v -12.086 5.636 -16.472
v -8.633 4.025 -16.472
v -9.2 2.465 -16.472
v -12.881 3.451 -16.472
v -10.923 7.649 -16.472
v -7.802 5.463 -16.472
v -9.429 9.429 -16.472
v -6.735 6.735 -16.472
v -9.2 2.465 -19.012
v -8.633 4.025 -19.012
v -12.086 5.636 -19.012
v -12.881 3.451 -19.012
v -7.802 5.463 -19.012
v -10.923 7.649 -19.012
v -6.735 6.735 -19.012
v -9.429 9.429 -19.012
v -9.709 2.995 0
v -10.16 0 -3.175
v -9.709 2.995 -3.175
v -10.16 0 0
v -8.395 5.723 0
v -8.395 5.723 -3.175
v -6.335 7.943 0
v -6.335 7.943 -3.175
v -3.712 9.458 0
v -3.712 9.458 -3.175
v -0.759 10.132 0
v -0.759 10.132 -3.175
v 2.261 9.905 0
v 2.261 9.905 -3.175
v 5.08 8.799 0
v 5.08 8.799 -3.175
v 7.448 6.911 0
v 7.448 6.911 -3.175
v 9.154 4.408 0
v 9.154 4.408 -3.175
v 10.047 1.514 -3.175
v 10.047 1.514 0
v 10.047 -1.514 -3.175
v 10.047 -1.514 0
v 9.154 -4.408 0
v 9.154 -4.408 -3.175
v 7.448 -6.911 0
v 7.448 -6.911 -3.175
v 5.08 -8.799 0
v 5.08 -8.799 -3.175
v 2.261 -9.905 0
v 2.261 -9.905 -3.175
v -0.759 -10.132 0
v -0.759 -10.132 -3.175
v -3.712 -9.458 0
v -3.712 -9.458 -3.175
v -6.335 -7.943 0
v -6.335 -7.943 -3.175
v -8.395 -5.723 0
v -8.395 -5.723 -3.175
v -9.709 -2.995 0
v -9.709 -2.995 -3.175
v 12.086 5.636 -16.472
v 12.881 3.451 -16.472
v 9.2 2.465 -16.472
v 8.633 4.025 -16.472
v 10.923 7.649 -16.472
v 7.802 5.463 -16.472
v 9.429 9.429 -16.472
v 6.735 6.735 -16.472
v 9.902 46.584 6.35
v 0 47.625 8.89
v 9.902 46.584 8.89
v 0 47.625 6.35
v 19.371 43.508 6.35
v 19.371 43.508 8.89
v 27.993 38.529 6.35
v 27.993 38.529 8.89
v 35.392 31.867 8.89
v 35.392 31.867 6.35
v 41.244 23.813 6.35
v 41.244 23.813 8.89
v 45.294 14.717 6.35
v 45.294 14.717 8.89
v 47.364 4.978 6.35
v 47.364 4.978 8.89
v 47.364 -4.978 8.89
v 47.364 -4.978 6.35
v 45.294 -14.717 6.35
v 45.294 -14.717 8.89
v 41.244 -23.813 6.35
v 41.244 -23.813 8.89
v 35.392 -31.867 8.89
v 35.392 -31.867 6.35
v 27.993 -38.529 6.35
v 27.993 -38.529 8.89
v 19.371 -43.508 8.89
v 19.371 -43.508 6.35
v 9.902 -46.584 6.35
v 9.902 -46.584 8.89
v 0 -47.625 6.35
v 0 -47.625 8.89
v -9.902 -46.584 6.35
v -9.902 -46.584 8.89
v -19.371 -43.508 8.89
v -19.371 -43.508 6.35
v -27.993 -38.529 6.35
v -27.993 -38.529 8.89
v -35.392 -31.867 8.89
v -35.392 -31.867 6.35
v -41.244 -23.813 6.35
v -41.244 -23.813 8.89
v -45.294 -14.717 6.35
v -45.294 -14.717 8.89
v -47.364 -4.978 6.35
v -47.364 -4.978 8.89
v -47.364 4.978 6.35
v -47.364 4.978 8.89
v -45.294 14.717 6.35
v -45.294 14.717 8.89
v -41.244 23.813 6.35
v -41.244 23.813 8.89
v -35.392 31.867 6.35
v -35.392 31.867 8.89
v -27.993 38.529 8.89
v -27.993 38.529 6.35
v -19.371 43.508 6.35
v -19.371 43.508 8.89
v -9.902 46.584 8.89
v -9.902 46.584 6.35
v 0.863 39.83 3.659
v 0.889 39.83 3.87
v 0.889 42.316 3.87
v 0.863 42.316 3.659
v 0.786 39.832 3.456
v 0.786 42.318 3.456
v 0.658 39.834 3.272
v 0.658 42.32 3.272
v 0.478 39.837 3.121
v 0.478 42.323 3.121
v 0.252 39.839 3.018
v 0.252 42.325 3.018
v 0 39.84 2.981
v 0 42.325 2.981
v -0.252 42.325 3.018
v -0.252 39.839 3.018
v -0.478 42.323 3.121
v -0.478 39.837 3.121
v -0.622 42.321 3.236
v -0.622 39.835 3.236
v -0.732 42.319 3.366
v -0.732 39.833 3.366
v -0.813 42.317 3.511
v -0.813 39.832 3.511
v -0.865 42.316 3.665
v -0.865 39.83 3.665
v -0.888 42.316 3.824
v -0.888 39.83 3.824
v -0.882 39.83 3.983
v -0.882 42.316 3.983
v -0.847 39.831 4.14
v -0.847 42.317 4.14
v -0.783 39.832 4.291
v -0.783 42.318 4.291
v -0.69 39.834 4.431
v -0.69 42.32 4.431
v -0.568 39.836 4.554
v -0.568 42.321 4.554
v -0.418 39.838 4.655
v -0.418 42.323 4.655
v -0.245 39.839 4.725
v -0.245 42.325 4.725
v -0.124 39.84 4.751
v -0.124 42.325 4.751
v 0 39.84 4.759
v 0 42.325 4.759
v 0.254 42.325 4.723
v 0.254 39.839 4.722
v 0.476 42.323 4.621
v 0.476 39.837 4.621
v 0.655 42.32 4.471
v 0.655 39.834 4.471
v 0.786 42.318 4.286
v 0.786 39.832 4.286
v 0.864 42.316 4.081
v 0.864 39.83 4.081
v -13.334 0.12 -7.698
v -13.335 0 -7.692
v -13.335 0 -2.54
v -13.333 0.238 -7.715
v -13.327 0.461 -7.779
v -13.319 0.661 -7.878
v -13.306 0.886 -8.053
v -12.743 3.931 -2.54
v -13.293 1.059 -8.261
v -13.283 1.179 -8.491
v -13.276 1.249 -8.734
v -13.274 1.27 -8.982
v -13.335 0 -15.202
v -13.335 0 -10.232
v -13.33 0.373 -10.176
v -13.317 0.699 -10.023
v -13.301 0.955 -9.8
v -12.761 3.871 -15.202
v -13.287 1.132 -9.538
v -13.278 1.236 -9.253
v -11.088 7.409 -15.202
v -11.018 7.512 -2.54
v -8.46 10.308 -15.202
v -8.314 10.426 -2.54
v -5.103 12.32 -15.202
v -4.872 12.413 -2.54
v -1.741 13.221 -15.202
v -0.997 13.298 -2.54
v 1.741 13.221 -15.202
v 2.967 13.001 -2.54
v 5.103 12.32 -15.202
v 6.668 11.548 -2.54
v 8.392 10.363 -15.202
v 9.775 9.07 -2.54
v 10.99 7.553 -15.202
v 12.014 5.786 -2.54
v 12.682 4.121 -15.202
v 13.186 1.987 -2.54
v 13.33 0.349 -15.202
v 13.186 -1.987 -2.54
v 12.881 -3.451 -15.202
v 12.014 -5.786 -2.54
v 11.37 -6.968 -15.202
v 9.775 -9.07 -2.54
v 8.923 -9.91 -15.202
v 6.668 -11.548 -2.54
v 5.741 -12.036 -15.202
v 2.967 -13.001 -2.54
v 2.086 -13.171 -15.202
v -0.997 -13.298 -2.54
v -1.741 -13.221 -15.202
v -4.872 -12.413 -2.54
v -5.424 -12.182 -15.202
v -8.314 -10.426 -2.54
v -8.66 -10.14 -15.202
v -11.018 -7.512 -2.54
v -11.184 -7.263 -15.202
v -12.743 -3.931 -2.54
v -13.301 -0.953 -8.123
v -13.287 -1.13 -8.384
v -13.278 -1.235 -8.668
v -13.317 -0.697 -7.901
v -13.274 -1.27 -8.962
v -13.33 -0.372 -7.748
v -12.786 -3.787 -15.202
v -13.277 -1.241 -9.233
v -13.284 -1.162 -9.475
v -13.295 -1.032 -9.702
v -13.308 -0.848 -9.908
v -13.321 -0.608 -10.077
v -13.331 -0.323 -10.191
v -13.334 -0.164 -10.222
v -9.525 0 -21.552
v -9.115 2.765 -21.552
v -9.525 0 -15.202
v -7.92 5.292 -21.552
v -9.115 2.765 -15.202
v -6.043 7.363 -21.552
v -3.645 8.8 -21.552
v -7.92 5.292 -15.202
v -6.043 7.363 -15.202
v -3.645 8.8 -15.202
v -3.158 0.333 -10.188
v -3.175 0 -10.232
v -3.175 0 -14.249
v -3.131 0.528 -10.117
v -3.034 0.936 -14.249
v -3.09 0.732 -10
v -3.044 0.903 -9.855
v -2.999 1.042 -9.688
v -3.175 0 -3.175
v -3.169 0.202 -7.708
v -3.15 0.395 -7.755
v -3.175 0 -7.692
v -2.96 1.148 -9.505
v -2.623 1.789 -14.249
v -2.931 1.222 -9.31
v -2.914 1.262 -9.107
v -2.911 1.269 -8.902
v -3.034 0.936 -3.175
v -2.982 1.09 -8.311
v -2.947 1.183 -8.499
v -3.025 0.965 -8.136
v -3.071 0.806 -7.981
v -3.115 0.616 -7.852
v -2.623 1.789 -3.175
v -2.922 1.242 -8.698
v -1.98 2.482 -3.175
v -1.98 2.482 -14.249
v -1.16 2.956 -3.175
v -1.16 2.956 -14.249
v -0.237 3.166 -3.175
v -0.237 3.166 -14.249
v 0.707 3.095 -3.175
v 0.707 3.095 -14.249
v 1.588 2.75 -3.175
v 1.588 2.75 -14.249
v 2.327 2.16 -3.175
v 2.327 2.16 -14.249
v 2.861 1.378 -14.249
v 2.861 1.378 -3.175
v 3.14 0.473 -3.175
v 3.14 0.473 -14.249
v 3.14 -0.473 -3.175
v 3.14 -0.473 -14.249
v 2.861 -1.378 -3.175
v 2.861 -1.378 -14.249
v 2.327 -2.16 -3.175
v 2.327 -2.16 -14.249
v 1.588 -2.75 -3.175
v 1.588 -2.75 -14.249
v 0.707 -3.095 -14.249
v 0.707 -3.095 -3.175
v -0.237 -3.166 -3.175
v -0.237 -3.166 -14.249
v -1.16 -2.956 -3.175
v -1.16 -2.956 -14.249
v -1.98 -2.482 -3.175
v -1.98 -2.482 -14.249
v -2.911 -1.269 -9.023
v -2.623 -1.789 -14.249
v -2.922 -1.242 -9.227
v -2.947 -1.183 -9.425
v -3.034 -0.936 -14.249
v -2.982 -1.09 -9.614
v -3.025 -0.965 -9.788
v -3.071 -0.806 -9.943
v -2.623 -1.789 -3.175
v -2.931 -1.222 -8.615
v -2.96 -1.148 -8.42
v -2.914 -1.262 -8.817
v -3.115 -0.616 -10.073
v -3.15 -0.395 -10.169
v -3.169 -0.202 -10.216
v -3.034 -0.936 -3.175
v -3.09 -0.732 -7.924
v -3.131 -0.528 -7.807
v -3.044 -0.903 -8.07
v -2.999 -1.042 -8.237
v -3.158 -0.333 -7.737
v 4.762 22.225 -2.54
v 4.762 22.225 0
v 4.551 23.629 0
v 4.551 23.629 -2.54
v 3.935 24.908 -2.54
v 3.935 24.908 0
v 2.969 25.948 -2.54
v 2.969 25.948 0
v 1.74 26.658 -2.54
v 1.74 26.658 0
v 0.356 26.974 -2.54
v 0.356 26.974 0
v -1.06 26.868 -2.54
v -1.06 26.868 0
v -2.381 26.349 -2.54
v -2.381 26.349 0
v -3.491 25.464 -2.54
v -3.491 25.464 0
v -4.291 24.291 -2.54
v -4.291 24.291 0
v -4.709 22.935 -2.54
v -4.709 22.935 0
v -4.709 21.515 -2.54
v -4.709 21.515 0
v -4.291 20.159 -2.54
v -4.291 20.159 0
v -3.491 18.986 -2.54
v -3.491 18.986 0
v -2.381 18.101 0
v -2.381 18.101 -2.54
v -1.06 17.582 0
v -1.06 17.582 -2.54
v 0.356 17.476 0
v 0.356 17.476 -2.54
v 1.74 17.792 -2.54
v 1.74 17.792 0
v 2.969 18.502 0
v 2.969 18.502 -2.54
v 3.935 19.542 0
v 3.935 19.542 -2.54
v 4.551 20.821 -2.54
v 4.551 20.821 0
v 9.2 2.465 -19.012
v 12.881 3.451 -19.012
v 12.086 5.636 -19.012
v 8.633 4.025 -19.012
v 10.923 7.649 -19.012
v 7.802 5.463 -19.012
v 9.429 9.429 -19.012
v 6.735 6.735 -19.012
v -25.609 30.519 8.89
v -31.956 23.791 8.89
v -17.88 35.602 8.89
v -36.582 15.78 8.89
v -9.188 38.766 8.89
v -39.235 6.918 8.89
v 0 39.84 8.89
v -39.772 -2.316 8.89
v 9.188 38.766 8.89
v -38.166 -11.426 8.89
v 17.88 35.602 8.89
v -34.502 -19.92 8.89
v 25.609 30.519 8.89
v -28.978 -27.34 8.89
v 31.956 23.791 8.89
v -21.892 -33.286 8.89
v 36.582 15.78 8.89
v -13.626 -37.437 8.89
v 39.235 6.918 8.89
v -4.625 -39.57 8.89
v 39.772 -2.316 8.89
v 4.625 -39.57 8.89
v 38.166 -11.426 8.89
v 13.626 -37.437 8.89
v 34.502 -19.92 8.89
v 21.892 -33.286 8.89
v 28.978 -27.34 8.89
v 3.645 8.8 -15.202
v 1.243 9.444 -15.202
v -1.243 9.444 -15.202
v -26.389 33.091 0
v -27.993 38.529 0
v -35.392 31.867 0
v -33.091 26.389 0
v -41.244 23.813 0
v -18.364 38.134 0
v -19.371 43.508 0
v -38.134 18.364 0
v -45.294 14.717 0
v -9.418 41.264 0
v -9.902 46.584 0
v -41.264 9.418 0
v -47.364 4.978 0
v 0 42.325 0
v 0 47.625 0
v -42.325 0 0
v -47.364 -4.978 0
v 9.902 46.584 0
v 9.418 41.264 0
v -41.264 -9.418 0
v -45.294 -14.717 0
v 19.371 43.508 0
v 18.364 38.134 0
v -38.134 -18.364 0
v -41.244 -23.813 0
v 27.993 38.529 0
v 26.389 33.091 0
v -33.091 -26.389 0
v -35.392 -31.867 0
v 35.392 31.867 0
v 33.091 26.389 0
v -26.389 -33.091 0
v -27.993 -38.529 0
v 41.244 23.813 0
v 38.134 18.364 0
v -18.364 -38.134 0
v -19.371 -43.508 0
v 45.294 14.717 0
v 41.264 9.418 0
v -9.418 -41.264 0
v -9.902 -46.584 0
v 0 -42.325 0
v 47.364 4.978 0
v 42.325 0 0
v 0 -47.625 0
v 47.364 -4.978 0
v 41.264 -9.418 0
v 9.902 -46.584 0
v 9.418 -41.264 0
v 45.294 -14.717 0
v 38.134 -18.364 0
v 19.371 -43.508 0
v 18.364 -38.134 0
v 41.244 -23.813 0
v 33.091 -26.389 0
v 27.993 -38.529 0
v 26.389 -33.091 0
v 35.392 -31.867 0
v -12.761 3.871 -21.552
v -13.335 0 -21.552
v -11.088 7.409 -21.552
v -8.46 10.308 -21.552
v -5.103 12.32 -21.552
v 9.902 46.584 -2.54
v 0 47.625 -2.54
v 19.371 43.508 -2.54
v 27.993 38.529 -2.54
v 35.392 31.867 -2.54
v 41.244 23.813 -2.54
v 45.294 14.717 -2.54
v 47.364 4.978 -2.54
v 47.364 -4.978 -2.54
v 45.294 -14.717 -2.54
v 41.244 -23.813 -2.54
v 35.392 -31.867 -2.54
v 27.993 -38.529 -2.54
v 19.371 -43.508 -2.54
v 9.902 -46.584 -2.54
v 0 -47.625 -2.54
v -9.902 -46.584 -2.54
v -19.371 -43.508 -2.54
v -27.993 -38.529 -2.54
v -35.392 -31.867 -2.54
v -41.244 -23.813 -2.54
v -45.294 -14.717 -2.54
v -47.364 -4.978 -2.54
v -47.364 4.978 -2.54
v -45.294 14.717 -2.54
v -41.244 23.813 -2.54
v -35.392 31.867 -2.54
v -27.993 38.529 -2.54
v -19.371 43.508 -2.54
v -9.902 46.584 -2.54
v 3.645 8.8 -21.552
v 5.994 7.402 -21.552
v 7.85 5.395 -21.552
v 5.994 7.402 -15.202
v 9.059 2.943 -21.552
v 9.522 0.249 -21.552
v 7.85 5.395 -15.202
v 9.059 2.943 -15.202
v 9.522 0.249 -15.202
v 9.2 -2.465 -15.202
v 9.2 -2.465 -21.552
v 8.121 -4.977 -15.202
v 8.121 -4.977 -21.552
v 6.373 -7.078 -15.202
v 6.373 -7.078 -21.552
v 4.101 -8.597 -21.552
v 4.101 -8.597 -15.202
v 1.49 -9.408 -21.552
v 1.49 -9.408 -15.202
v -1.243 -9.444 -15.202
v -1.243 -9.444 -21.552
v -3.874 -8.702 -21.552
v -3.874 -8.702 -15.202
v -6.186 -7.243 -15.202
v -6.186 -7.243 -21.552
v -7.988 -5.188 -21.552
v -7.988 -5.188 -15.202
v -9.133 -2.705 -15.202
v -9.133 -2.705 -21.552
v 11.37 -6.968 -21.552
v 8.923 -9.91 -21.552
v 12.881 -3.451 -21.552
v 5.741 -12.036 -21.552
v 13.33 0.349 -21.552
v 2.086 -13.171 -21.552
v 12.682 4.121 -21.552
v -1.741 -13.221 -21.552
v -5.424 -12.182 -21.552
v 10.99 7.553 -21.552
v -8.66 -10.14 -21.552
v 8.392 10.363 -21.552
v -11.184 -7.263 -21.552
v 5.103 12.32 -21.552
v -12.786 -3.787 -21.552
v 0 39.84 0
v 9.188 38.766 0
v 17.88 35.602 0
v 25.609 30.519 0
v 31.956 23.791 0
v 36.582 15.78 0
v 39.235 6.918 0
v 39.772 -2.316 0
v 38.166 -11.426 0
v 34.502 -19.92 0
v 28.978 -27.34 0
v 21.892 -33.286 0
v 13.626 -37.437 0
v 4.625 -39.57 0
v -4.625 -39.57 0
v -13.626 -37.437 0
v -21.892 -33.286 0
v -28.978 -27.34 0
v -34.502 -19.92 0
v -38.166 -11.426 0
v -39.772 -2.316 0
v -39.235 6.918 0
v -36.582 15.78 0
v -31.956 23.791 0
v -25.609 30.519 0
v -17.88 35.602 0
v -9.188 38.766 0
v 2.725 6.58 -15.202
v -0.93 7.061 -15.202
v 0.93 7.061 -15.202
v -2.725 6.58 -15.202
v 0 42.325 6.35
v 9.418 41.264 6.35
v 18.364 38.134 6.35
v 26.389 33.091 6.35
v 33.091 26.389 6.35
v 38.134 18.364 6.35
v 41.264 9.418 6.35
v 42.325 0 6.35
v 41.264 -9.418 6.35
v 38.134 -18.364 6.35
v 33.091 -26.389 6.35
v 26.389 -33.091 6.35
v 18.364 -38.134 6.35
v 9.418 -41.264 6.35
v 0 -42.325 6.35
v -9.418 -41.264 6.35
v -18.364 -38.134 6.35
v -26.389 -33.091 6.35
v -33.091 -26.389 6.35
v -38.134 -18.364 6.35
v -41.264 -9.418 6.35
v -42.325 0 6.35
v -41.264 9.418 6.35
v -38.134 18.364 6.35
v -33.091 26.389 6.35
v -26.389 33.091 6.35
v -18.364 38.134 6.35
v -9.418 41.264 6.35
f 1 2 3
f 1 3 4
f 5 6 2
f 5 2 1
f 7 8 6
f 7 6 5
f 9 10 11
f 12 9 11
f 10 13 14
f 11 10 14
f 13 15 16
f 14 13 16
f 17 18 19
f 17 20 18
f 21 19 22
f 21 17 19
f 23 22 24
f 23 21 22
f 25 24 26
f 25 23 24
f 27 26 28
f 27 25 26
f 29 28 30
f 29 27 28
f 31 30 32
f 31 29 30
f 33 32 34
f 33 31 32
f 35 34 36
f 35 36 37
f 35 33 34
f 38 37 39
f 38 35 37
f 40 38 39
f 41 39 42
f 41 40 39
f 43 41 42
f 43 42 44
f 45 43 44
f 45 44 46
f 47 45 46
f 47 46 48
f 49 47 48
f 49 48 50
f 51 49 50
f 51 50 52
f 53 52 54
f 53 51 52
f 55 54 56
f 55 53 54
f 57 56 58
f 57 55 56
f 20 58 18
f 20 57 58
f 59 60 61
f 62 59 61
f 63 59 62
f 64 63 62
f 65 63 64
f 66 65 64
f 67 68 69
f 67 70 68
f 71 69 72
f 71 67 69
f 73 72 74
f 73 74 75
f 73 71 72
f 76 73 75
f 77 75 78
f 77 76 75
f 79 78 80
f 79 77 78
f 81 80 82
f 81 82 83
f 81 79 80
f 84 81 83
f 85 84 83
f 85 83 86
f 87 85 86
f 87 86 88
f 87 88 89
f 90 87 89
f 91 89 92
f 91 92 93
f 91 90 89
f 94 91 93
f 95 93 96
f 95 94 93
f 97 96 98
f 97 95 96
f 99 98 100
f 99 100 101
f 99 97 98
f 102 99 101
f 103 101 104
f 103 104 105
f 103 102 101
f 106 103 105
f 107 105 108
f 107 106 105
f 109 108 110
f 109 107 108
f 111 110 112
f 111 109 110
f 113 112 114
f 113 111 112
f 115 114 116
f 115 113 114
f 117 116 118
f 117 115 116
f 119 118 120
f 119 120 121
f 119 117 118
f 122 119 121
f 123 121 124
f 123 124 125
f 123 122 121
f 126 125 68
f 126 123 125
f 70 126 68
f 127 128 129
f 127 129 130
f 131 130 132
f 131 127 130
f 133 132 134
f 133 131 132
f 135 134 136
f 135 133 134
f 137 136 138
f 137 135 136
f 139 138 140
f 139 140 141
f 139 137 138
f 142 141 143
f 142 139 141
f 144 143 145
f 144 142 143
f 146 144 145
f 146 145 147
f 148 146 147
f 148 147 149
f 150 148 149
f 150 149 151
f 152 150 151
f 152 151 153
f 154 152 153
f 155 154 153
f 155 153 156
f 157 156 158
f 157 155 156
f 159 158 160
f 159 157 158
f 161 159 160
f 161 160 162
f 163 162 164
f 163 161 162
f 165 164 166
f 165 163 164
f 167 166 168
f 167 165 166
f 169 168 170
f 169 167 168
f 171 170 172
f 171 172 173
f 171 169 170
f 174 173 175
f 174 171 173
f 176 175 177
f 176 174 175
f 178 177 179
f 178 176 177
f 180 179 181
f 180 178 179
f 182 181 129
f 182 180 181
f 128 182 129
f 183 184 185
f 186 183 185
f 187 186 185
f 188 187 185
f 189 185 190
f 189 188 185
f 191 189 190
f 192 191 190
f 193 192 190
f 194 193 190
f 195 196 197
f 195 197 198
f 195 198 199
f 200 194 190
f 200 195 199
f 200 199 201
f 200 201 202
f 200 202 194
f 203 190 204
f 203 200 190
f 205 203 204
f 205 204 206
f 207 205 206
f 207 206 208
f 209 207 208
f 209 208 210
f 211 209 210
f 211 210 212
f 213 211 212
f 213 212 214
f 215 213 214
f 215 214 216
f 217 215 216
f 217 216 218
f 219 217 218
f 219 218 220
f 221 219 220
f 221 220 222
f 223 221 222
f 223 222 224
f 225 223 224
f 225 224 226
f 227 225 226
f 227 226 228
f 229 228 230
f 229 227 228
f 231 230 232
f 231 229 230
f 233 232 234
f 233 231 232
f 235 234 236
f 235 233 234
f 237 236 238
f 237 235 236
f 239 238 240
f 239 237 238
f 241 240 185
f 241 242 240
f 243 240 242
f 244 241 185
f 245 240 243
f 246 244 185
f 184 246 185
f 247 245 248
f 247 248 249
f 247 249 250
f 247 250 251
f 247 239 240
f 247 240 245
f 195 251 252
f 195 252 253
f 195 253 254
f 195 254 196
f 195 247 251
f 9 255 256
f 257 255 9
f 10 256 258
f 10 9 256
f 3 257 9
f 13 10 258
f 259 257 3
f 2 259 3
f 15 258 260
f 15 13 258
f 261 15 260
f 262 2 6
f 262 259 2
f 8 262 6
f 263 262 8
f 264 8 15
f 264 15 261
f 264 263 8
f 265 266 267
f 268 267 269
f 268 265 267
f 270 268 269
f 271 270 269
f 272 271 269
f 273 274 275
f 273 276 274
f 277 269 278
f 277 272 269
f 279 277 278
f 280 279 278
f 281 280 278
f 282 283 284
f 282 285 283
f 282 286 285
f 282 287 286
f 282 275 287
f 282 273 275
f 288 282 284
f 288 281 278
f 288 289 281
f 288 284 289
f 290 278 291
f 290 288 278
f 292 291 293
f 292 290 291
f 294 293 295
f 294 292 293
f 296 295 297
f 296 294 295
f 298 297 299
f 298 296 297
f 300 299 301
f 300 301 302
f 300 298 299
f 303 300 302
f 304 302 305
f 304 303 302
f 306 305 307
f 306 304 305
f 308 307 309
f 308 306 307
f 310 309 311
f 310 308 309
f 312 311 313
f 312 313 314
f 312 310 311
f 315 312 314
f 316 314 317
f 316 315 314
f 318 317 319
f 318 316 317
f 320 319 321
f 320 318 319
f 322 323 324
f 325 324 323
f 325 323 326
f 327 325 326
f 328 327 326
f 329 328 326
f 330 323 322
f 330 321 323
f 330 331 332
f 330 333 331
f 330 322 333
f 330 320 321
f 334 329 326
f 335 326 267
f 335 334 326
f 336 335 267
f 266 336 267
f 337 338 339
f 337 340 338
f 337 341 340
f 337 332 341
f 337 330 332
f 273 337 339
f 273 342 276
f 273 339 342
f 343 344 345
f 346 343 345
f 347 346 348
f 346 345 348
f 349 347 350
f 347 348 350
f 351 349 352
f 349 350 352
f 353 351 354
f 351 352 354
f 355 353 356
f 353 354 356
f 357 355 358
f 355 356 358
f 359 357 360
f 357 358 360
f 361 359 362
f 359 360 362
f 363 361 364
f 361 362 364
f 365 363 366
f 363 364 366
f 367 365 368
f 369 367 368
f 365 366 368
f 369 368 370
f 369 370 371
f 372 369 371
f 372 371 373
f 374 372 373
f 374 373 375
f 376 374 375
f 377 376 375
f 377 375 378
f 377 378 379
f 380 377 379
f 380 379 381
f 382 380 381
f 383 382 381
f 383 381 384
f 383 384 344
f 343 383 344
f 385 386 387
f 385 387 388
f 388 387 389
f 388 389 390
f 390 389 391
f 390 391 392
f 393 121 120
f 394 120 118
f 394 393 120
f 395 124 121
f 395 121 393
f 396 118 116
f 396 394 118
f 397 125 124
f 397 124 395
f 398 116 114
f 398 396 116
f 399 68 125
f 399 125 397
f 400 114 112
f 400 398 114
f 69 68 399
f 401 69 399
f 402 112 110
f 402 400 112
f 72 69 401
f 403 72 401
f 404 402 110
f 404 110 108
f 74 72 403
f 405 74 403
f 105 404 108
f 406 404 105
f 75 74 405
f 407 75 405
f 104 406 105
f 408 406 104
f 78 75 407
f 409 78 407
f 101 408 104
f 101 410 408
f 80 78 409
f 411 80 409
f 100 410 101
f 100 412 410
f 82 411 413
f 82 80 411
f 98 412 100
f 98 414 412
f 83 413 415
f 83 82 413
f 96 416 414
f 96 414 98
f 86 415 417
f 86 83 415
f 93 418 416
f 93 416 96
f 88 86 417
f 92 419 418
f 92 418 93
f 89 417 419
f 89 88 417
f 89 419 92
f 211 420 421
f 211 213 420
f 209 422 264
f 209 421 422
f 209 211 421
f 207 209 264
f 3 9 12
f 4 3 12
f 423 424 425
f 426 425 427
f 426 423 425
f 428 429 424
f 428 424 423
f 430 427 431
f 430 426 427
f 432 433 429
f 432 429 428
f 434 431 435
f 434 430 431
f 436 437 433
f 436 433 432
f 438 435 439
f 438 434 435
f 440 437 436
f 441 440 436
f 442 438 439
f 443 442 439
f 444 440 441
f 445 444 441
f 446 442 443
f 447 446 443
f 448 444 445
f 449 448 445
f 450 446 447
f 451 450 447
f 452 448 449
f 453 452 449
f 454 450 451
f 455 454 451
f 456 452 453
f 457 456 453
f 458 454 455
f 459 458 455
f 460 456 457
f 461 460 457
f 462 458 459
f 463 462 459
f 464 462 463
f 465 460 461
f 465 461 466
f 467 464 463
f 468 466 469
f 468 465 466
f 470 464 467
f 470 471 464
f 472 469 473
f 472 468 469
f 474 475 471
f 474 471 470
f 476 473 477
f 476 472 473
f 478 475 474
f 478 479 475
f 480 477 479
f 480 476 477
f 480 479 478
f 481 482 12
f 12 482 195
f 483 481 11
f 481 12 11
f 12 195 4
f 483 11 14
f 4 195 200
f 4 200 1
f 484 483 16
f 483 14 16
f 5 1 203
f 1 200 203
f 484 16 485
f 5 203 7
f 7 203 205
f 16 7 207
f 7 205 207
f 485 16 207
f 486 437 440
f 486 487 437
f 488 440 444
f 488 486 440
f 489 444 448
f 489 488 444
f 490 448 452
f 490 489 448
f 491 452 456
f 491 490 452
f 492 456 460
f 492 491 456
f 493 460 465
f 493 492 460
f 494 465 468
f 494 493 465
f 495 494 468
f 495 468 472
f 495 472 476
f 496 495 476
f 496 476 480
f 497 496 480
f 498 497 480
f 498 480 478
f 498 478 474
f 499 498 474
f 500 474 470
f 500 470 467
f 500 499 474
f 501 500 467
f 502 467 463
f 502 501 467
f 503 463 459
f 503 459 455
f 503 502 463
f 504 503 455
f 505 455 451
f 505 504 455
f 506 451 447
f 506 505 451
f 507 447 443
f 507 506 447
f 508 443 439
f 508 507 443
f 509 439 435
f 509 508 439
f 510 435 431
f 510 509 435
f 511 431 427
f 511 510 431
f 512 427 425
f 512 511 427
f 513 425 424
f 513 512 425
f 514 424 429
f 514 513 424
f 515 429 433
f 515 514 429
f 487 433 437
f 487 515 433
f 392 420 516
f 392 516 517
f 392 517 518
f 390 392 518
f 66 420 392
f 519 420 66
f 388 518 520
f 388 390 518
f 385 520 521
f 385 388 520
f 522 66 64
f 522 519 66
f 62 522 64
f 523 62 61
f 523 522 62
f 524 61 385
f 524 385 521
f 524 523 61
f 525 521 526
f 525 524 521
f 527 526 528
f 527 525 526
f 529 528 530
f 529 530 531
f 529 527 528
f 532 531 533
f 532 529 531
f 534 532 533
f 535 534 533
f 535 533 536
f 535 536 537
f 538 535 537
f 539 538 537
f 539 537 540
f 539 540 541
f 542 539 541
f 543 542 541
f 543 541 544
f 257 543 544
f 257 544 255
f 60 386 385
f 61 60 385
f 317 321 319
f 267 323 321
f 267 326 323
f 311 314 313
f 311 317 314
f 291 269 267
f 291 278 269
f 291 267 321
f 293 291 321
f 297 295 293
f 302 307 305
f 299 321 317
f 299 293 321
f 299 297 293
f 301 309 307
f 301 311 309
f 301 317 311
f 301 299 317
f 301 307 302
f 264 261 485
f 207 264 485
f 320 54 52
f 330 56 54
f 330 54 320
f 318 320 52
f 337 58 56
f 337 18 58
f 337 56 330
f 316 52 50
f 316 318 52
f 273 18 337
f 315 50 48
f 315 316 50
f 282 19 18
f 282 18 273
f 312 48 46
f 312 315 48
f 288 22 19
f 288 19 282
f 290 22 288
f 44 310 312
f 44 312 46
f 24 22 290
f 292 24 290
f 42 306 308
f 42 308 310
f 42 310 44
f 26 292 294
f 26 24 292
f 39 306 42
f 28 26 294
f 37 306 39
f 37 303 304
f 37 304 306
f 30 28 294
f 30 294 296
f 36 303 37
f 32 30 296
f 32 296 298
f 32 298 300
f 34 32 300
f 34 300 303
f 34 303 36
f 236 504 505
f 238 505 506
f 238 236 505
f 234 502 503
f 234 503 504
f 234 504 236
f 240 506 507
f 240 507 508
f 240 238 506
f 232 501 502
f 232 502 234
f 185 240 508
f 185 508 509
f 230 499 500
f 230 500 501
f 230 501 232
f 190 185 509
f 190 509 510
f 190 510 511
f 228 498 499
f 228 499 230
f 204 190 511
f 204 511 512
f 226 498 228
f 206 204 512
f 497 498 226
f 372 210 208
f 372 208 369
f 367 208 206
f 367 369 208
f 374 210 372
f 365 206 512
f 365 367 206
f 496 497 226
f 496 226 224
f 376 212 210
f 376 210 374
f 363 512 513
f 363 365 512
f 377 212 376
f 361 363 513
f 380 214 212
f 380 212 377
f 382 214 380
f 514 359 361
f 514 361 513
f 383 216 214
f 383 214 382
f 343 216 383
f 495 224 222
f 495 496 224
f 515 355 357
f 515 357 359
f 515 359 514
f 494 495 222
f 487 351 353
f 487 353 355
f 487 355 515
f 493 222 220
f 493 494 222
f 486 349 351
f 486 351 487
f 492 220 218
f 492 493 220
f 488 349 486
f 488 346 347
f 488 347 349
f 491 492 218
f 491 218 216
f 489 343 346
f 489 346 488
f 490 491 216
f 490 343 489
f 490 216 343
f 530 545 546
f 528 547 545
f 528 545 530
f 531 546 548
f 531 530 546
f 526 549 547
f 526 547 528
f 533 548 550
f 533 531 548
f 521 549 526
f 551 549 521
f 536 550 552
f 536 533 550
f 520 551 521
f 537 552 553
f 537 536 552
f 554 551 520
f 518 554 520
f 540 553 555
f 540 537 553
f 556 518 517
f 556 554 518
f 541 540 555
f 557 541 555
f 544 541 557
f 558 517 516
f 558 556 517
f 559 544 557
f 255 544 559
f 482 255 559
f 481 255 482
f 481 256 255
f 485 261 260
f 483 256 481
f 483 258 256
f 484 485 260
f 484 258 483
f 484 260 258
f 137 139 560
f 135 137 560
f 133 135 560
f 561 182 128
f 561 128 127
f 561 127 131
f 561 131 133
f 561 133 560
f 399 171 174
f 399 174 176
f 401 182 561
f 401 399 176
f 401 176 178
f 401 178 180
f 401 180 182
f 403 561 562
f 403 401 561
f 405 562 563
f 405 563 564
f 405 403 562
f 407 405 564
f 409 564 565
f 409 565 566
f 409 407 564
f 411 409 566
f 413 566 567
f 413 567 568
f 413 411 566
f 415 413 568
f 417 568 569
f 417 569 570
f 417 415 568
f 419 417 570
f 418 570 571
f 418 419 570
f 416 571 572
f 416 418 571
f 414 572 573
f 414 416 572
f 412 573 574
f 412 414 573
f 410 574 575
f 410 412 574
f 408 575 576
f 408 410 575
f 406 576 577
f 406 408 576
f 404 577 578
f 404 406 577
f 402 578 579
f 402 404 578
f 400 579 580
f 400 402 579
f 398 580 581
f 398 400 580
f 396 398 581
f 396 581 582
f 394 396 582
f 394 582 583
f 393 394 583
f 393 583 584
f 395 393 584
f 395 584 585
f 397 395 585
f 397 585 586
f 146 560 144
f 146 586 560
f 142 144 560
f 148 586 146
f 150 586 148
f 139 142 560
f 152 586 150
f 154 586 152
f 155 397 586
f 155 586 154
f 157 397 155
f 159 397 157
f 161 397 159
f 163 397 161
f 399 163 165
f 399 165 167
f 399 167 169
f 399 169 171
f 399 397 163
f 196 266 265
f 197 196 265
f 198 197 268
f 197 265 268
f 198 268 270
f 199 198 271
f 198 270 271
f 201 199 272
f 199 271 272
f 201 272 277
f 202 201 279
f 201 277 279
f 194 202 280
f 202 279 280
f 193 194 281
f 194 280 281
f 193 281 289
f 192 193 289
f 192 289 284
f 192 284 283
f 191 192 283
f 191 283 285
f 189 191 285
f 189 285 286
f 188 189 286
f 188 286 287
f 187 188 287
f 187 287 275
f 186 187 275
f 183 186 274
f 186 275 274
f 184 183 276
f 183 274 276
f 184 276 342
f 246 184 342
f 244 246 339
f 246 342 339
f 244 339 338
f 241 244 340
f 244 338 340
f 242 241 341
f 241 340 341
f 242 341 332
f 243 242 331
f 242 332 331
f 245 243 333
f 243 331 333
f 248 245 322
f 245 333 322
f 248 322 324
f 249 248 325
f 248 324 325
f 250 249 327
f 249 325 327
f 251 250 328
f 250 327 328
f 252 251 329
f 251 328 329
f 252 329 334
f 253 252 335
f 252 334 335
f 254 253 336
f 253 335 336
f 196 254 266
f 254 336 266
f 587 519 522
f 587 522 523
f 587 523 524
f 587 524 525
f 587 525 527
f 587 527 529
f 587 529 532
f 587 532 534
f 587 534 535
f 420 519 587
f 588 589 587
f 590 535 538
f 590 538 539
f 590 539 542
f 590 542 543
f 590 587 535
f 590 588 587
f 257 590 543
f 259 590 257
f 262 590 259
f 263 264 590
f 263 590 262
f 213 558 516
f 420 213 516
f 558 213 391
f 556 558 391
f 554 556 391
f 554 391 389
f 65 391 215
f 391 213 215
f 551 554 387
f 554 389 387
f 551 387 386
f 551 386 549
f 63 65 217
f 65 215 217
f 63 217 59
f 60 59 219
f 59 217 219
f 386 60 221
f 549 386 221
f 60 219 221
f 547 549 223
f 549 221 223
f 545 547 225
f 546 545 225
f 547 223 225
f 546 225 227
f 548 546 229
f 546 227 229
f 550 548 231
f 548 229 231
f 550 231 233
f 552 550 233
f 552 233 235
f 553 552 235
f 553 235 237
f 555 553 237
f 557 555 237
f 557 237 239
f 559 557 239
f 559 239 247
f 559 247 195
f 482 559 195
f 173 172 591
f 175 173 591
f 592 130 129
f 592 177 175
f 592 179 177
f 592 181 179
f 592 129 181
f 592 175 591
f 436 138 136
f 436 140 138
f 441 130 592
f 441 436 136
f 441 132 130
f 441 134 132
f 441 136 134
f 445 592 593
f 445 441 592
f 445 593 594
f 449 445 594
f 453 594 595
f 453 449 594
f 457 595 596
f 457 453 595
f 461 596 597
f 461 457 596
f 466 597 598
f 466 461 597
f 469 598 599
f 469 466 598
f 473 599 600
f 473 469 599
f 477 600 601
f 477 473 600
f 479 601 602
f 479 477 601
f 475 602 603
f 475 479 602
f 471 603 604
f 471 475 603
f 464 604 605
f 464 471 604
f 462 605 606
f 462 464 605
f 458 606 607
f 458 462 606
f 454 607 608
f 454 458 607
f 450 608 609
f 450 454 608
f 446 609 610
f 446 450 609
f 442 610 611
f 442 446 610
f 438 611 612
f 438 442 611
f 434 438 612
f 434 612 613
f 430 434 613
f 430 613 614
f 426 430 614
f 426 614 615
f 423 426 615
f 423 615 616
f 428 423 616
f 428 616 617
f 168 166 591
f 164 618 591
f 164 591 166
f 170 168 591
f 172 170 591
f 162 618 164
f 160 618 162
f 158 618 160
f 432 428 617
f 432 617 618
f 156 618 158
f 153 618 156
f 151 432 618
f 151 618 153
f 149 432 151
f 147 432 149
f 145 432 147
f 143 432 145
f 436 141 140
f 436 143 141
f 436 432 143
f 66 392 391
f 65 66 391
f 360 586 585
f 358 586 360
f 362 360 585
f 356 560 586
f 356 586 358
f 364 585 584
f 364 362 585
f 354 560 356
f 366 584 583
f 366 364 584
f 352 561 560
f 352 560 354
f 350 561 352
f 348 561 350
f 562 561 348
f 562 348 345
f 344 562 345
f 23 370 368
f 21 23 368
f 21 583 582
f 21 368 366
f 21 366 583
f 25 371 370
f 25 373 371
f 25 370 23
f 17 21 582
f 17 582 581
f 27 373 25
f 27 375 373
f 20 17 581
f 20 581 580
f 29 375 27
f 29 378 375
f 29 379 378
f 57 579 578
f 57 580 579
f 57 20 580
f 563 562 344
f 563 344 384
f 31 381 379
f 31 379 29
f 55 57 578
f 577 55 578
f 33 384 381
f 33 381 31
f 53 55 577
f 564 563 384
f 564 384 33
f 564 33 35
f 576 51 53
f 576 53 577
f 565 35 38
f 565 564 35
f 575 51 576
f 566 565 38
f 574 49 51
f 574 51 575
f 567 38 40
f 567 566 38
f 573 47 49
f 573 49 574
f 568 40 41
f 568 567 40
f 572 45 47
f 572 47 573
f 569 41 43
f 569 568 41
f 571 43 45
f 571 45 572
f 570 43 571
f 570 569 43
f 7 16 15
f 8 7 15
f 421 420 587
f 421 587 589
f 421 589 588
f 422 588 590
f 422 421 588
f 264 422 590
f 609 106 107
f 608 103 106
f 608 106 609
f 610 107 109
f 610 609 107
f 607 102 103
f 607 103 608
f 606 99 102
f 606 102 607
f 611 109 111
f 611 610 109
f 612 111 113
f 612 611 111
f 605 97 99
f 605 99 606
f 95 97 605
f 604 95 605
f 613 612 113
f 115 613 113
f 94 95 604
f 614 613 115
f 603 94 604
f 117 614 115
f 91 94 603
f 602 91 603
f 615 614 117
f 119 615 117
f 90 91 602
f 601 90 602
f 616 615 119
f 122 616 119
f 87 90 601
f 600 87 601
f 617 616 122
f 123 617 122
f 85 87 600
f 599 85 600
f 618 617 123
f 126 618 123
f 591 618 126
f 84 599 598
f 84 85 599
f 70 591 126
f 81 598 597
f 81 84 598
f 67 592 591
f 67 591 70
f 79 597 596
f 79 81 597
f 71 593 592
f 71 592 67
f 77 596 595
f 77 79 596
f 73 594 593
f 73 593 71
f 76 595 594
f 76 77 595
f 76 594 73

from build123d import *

# Parameters (mm, degrees)
SKETCH3_R           = 10.16
CUT_EXTRUDE1_DEPTH  = 2.54
SKETCH5_R           = 4.7625
CUT_EXTRUDE2_DEPTH  = 6.35
SKETCH6_R           = 13.335
SKETCH6_R_2         = 9.525
BOSS_EXTRUDE1_DEPTH = 6.35
SKETCH7_R           = 1.27
CUT_EXTRUDE3_DEPTH  = 25.4
CUT_EXTRUDE4_DEPTH  = 6.35
CUT_EXTRUDE5_DEPTH  = 2.54
SKETCH11_R          = 0.889
CUT_EXTRUDE6_DEPTH  = 55.372


with BuildPart() as part:
    # Sketch2 → Revolve1 (revolve)
    with BuildSketch(Plane(origin=(0, 0, 0), x_dir=(0, 0, -1), z_dir=(1, 0, 0))):
        Polygon((-6.35, 42.32529), (0, 42.32529), (0, 47.625), (2.54, 47.625), (2.54, 0), (0, 0), (0, 39.839805153), (-8.89, 39.839805153), (-8.89, 47.625), (-6.35, 47.625), align=None)
    revolve(axis=Axis((0, 0, 0), (0, 0, -1)))

    # Sketch3 → Cut-Extrude1 (cut)
    with BuildSketch(Plane.XY):
        Circle(SKETCH3_R)
    extrude(amount=-CUT_EXTRUDE1_DEPTH, mode=Mode.SUBTRACT)

    # Sketch4 → Revolve2 (revolve)
    with BuildSketch(Plane(origin=(0, 0, 0), x_dir=(1, 0, 0), z_dir=(0, 1, 0))):
        Polygon((0, 14.2494), (-3.175, 14.2494), (-3.175, 3.175), (-10.16, 3.175), (-10.16, 0), (-13.335, 0), (-13.335, 15.2019), (0, 15.2019), align=None)
    revolve(axis=Axis((0, 0, 0), (0, 0, -1)))

    # Sketch5 → Cut-Extrude2 (cut)
    with BuildSketch(Plane.XY):
        with Locations((0, 22.225)):
            Circle(SKETCH5_R)
    extrude(amount=-CUT_EXTRUDE2_DEPTH, mode=Mode.SUBTRACT)

    # Sketch6 → Boss-Extrude1 (add)
    with BuildSketch(Plane(origin=(0, 0, -15.2019), x_dir=(-1, 0, 0), z_dir=(0, 0, -1))):
        Circle(SKETCH6_R)
        Circle(SKETCH6_R_2, mode=Mode.SUBTRACT)
    extrude(amount=BOSS_EXTRUDE1_DEPTH)

    # Sketch7 → Cut-Extrude3 (cut)
    with BuildSketch(Plane(origin=(0, 0, 0), x_dir=(0, 0, -1), z_dir=(1, 0, 0))):
        with Locations((8.962319715, 0)):
            Circle(SKETCH7_R)
    extrude(amount=-CUT_EXTRUDE3_DEPTH, mode=Mode.SUBTRACT)

    # Sketch8 → Cut-Extrude4 (cut)
    with BuildSketch(Plane(origin=(0, 0, -21.5519), x_dir=(-1, 0, 0), z_dir=(0, 0, -1))):
        with BuildLine():
            Line((2.725322184, 6.579509779), (5.964417729, 14.399378174))
            ThreePointArc((5.964417729, 14.399378174), (0, 15.585774625), (-5.964417729, 14.399378174))
            Line((-5.964417729, 14.399378174), (-2.725322184, 6.579509779))
            ThreePointArc((-2.725322184, 6.579509779), (0, 7.121610066), (2.725322184, 6.579509779))
        make_face()
    extrude(amount=-CUT_EXTRUDE4_DEPTH, mode=Mode.SUBTRACT)

    # Sketch10 → Cut-Extrude5 (cut)
    with BuildSketch(Plane(origin=(0, 0, -19.0119), x_dir=(-1, 0, 0), z_dir=(0, 0, -1))):
        with BuildLine():
            Line((6.29135007, 1.685762171), (16.396038566, 4.393305293))
            ThreePointArc((16.396038566, 4.393305293), (14.700286019, 8.48721409), (12.002733273, 12.002733273))
            Line((12.002733273, 12.002733273), (4.6055879, 4.6055879))
            ThreePointArc((4.6055879, 4.6055879), (5.64067016, 3.256642435), (6.29135007, 1.685762171))
        make_face()
        with BuildLine():
            Line((-4.6055879, 4.6055879), (-12.002733273, 12.002733273))
            ThreePointArc((-12.002733273, 12.002733273), (-14.700286019, 8.48721409), (-16.396038566, 4.393305293))
            Line((-16.396038566, 4.393305293), (-6.29135007, 1.685762171))
            ThreePointArc((-6.29135007, 1.685762171), (-5.64067016, 3.256642435), (-4.6055879, 4.6055879))
        make_face()
    extrude(amount=-CUT_EXTRUDE5_DEPTH, mode=Mode.SUBTRACT)

    # Sketch11 → Cut-Extrude6 (cut)
    with BuildSketch(Plane(origin=(0, 0, 0), x_dir=(1, 0, 0), z_dir=(0, 1, 0))):
        with Locations((0, -3.870418615)):
            Circle(SKETCH11_R)
    extrude(amount=CUT_EXTRUDE6_DEPTH, mode=Mode.SUBTRACT)


solid = part.part
